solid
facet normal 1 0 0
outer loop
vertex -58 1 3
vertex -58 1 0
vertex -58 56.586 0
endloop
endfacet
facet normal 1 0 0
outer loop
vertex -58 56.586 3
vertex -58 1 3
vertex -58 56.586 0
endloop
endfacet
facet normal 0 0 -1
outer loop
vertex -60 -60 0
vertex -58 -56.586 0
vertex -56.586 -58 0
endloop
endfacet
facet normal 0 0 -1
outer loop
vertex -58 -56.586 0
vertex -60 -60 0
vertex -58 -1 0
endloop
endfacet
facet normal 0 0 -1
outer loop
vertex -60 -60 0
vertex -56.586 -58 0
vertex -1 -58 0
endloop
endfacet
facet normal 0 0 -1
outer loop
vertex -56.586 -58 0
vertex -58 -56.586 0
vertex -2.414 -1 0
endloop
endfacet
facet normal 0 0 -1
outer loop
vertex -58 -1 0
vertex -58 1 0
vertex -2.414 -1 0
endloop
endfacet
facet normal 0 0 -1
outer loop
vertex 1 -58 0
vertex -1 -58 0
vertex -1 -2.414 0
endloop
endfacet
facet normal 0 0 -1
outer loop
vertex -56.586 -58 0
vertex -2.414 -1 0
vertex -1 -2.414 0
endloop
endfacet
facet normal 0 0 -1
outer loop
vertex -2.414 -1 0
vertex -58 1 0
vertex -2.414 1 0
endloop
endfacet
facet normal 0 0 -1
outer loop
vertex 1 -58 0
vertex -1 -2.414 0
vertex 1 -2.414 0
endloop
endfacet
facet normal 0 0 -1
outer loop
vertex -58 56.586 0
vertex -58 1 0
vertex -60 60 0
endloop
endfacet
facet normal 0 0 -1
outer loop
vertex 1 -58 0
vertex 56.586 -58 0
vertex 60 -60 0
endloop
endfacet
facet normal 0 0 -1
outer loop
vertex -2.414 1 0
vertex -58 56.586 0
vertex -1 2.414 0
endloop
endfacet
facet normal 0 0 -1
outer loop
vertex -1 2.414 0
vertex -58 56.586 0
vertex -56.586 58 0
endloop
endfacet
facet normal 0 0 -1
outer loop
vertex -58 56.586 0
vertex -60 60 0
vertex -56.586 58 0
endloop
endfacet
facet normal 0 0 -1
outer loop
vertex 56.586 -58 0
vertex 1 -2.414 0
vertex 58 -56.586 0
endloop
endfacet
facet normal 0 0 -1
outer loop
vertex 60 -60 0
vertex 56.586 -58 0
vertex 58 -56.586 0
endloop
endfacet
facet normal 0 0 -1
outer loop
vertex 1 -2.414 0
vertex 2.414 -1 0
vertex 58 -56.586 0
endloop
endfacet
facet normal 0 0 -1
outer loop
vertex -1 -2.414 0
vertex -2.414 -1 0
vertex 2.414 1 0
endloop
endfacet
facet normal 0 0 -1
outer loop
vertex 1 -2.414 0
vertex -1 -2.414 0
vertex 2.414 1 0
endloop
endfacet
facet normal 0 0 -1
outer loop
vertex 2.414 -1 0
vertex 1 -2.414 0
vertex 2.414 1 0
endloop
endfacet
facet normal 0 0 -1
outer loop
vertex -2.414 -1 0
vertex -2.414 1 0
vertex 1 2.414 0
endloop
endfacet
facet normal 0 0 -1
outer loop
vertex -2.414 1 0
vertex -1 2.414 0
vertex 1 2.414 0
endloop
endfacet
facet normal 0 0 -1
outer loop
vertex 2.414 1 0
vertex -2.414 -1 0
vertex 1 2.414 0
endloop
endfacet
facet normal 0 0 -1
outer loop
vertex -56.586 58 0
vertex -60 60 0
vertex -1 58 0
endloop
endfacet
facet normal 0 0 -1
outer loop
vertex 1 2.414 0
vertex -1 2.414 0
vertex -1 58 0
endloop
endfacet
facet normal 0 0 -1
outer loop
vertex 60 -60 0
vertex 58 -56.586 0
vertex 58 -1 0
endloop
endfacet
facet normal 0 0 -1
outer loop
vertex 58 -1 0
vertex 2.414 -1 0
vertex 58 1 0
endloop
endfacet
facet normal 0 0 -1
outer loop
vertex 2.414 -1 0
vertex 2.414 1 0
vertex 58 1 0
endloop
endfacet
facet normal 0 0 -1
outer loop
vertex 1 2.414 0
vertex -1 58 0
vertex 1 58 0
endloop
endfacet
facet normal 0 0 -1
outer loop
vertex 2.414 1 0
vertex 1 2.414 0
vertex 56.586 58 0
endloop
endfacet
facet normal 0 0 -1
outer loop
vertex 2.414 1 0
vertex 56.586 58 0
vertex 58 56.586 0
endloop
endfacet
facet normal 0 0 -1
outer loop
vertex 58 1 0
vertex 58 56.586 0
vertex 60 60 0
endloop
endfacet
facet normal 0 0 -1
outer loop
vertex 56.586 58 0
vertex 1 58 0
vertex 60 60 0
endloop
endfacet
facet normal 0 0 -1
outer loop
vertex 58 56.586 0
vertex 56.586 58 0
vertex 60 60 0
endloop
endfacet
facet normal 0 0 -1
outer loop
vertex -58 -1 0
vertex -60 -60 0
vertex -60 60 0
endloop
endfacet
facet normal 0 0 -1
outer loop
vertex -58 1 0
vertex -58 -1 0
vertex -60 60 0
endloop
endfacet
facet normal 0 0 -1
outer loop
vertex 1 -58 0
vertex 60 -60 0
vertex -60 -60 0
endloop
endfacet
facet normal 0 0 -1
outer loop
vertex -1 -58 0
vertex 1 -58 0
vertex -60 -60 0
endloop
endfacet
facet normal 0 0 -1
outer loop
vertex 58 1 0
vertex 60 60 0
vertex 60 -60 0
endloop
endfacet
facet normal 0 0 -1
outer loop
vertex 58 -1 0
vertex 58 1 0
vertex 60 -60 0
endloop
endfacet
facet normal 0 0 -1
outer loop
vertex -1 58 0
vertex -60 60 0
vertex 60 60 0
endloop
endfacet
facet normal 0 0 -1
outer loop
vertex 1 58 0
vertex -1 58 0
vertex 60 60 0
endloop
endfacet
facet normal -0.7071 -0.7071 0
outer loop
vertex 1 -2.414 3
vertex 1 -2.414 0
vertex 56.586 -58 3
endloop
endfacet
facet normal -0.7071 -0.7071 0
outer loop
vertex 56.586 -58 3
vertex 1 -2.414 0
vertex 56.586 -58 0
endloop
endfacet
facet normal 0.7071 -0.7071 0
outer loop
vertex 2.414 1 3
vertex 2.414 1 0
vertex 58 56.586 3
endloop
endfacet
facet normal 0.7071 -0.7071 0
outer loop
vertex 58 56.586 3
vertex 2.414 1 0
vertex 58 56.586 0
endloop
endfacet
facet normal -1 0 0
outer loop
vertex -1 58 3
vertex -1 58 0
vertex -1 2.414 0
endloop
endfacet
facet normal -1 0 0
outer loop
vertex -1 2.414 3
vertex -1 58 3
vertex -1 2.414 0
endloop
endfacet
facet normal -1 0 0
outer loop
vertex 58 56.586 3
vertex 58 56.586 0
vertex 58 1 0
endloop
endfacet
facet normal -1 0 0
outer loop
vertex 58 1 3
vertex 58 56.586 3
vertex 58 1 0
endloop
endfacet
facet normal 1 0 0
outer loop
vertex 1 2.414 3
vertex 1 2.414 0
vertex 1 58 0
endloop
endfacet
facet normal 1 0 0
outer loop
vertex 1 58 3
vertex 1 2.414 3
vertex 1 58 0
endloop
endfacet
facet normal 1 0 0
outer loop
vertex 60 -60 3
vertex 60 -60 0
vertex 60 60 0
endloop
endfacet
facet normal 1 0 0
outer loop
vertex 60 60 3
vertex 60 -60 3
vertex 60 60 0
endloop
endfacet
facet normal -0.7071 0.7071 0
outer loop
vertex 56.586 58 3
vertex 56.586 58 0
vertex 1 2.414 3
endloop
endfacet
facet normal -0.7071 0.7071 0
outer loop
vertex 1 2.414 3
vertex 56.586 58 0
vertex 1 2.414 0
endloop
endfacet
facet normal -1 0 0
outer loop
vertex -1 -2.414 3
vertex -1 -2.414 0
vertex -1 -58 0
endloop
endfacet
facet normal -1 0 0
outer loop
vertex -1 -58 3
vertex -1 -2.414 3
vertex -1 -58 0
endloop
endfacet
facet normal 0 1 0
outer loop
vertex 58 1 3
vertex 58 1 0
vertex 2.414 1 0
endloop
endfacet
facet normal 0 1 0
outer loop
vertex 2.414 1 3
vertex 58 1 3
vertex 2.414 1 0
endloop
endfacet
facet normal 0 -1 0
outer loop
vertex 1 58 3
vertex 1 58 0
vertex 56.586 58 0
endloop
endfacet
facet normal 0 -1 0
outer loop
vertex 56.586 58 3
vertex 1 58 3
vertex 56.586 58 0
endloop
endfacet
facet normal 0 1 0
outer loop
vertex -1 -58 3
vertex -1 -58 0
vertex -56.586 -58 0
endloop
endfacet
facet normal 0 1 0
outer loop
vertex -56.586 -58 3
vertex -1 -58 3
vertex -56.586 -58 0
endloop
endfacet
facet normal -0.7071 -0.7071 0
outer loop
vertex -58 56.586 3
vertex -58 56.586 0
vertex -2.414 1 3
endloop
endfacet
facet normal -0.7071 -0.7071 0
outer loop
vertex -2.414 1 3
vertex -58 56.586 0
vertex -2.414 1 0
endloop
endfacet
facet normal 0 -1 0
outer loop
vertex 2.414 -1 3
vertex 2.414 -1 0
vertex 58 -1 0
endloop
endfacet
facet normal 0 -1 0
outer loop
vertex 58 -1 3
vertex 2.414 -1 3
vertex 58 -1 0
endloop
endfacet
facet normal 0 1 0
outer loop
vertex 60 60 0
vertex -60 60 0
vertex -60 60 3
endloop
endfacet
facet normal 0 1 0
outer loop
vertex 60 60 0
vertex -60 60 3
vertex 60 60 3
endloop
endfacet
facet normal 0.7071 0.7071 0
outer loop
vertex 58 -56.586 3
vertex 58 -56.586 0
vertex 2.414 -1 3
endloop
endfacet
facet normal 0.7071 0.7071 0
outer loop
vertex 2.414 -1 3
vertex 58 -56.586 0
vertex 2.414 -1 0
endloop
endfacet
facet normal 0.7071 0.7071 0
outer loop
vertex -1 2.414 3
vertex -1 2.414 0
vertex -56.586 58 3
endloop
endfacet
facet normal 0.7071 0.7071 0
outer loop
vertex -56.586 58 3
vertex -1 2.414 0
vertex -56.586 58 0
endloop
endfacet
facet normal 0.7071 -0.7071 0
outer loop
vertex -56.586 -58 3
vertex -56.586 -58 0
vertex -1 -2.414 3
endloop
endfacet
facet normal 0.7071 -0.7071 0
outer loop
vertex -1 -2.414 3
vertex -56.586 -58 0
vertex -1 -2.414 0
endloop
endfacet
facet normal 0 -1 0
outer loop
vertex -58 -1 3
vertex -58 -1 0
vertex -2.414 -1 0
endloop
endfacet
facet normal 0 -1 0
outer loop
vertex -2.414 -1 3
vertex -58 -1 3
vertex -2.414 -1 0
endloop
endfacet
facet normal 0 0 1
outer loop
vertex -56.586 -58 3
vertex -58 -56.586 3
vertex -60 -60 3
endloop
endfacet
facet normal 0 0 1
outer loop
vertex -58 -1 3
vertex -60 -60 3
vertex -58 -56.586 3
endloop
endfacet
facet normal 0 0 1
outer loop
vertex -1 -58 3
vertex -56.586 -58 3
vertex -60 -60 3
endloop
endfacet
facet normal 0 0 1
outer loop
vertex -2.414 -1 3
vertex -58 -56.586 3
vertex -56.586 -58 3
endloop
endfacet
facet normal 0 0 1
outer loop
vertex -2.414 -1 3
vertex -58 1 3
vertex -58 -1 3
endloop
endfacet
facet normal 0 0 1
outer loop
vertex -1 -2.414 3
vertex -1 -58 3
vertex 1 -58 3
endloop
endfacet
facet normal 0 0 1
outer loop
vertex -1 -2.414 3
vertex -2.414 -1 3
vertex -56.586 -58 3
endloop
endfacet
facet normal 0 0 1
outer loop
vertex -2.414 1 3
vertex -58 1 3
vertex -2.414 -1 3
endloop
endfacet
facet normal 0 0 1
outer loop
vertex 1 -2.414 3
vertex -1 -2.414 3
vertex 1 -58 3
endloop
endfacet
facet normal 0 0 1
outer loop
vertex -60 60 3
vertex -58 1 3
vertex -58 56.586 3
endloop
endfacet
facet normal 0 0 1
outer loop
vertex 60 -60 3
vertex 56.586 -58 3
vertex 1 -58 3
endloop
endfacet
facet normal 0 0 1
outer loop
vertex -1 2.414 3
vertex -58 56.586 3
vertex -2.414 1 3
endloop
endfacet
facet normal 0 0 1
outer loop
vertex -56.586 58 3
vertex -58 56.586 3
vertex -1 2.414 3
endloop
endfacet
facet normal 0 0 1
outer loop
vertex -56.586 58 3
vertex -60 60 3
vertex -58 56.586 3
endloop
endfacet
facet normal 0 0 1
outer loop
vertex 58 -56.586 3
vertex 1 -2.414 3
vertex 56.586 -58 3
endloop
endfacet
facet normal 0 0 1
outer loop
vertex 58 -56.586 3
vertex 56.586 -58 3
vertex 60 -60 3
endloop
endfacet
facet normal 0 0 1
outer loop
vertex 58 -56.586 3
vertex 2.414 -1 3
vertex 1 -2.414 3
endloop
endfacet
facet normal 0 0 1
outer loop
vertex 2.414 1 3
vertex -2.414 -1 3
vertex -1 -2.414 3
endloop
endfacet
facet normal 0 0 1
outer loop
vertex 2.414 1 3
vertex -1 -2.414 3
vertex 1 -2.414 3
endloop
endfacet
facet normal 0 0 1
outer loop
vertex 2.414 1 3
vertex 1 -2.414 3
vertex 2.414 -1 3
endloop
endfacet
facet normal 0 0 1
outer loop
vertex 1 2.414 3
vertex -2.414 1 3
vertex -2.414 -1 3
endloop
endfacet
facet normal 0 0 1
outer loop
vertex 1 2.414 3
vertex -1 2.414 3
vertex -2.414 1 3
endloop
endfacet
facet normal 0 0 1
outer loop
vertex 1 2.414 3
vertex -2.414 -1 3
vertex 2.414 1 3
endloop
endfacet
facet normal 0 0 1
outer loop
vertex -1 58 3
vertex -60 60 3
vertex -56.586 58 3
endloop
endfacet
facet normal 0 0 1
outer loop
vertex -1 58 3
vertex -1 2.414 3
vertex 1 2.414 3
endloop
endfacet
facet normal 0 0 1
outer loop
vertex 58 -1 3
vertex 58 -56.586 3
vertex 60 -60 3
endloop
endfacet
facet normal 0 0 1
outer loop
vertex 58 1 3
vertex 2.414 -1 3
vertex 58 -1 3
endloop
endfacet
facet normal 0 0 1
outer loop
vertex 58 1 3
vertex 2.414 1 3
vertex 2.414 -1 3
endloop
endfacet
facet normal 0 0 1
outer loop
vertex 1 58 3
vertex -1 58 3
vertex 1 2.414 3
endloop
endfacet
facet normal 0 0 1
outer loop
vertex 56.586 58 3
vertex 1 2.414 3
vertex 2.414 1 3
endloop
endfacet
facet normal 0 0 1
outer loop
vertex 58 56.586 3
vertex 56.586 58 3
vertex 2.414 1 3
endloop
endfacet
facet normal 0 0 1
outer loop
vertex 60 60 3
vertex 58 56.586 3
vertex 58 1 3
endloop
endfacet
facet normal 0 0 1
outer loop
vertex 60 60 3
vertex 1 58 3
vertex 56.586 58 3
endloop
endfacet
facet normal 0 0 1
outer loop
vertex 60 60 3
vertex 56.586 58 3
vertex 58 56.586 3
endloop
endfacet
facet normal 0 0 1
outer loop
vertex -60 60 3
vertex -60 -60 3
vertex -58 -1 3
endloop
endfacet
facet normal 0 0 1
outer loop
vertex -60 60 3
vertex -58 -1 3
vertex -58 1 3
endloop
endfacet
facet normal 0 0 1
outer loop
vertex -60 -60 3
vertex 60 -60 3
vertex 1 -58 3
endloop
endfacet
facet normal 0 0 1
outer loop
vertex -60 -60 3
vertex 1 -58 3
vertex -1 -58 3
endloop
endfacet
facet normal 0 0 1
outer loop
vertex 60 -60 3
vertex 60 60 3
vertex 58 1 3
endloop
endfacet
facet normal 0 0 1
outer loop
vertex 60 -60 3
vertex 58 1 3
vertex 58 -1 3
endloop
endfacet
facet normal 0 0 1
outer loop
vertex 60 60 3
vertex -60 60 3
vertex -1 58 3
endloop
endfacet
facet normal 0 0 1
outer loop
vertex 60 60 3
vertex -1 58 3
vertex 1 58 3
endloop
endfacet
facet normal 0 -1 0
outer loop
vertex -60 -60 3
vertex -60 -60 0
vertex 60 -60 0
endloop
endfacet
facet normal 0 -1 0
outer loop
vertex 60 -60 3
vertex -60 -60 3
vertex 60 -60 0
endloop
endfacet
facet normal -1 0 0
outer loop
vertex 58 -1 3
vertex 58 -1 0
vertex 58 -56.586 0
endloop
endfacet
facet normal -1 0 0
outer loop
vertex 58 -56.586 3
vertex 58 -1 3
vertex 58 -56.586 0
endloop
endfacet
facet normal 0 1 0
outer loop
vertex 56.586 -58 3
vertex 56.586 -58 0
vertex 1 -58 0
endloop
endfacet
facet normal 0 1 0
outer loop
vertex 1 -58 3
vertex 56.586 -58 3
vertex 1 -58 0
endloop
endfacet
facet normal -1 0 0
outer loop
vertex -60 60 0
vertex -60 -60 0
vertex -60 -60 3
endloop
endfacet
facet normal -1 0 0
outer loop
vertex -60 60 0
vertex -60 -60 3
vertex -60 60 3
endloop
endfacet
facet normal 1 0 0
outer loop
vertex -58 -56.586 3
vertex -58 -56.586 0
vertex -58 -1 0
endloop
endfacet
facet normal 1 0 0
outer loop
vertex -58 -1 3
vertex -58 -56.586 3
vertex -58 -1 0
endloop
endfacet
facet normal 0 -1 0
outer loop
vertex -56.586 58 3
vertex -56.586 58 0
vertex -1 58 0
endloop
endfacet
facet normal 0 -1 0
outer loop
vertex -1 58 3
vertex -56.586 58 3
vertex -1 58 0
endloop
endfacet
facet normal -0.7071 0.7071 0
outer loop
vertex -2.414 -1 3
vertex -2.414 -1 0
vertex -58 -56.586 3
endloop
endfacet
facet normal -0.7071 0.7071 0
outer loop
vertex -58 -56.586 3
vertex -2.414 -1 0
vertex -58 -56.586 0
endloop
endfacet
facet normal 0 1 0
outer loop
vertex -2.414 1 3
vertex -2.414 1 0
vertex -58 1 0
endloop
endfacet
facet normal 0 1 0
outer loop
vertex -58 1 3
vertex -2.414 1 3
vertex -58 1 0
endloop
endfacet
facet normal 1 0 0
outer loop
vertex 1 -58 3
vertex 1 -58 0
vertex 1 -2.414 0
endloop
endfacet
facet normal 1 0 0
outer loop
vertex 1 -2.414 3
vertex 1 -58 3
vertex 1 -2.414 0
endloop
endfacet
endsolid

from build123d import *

# Parameters (mm, degrees)
F0_W     = 120
F0_H     = 120
F1_DEPTH = 3


with BuildPart() as f1:
    # F0 (on Top) → F1 (new body)
    with BuildSketch(Plane.XY):
        Rectangle(F0_W, F0_H)
        Polygon((-1, -58), (-56.585786, -58), (-1, -2.414214), align=None, mode=Mode.SUBTRACT)
        Polygon((-58, -56.585786), (-58, -1), (-2.414214, -1), align=None, mode=Mode.SUBTRACT)
        Polygon((1, -58), (1, -2.414214), (56.585786, -58), align=None, mode=Mode.SUBTRACT)
        Polygon((58, -56.585786), (2.414214, -1), (58, -1), align=None, mode=Mode.SUBTRACT)
        Polygon((-58, 1), (-58, 56.585786), (-2.414214, 1), align=None, mode=Mode.SUBTRACT)
        Polygon((-1, 2.414214), (-56.585786, 58), (-1, 58), align=None, mode=Mode.SUBTRACT)
        Polygon((58, 1), (2.414214, 1), (58, 56.585786), align=None, mode=Mode.SUBTRACT)
        Polygon((1, 2.414214), (1, 58), (56.585786, 58), align=None, mode=Mode.SUBTRACT)
    extrude(amount=F1_DEPTH)


solid = f1.part
